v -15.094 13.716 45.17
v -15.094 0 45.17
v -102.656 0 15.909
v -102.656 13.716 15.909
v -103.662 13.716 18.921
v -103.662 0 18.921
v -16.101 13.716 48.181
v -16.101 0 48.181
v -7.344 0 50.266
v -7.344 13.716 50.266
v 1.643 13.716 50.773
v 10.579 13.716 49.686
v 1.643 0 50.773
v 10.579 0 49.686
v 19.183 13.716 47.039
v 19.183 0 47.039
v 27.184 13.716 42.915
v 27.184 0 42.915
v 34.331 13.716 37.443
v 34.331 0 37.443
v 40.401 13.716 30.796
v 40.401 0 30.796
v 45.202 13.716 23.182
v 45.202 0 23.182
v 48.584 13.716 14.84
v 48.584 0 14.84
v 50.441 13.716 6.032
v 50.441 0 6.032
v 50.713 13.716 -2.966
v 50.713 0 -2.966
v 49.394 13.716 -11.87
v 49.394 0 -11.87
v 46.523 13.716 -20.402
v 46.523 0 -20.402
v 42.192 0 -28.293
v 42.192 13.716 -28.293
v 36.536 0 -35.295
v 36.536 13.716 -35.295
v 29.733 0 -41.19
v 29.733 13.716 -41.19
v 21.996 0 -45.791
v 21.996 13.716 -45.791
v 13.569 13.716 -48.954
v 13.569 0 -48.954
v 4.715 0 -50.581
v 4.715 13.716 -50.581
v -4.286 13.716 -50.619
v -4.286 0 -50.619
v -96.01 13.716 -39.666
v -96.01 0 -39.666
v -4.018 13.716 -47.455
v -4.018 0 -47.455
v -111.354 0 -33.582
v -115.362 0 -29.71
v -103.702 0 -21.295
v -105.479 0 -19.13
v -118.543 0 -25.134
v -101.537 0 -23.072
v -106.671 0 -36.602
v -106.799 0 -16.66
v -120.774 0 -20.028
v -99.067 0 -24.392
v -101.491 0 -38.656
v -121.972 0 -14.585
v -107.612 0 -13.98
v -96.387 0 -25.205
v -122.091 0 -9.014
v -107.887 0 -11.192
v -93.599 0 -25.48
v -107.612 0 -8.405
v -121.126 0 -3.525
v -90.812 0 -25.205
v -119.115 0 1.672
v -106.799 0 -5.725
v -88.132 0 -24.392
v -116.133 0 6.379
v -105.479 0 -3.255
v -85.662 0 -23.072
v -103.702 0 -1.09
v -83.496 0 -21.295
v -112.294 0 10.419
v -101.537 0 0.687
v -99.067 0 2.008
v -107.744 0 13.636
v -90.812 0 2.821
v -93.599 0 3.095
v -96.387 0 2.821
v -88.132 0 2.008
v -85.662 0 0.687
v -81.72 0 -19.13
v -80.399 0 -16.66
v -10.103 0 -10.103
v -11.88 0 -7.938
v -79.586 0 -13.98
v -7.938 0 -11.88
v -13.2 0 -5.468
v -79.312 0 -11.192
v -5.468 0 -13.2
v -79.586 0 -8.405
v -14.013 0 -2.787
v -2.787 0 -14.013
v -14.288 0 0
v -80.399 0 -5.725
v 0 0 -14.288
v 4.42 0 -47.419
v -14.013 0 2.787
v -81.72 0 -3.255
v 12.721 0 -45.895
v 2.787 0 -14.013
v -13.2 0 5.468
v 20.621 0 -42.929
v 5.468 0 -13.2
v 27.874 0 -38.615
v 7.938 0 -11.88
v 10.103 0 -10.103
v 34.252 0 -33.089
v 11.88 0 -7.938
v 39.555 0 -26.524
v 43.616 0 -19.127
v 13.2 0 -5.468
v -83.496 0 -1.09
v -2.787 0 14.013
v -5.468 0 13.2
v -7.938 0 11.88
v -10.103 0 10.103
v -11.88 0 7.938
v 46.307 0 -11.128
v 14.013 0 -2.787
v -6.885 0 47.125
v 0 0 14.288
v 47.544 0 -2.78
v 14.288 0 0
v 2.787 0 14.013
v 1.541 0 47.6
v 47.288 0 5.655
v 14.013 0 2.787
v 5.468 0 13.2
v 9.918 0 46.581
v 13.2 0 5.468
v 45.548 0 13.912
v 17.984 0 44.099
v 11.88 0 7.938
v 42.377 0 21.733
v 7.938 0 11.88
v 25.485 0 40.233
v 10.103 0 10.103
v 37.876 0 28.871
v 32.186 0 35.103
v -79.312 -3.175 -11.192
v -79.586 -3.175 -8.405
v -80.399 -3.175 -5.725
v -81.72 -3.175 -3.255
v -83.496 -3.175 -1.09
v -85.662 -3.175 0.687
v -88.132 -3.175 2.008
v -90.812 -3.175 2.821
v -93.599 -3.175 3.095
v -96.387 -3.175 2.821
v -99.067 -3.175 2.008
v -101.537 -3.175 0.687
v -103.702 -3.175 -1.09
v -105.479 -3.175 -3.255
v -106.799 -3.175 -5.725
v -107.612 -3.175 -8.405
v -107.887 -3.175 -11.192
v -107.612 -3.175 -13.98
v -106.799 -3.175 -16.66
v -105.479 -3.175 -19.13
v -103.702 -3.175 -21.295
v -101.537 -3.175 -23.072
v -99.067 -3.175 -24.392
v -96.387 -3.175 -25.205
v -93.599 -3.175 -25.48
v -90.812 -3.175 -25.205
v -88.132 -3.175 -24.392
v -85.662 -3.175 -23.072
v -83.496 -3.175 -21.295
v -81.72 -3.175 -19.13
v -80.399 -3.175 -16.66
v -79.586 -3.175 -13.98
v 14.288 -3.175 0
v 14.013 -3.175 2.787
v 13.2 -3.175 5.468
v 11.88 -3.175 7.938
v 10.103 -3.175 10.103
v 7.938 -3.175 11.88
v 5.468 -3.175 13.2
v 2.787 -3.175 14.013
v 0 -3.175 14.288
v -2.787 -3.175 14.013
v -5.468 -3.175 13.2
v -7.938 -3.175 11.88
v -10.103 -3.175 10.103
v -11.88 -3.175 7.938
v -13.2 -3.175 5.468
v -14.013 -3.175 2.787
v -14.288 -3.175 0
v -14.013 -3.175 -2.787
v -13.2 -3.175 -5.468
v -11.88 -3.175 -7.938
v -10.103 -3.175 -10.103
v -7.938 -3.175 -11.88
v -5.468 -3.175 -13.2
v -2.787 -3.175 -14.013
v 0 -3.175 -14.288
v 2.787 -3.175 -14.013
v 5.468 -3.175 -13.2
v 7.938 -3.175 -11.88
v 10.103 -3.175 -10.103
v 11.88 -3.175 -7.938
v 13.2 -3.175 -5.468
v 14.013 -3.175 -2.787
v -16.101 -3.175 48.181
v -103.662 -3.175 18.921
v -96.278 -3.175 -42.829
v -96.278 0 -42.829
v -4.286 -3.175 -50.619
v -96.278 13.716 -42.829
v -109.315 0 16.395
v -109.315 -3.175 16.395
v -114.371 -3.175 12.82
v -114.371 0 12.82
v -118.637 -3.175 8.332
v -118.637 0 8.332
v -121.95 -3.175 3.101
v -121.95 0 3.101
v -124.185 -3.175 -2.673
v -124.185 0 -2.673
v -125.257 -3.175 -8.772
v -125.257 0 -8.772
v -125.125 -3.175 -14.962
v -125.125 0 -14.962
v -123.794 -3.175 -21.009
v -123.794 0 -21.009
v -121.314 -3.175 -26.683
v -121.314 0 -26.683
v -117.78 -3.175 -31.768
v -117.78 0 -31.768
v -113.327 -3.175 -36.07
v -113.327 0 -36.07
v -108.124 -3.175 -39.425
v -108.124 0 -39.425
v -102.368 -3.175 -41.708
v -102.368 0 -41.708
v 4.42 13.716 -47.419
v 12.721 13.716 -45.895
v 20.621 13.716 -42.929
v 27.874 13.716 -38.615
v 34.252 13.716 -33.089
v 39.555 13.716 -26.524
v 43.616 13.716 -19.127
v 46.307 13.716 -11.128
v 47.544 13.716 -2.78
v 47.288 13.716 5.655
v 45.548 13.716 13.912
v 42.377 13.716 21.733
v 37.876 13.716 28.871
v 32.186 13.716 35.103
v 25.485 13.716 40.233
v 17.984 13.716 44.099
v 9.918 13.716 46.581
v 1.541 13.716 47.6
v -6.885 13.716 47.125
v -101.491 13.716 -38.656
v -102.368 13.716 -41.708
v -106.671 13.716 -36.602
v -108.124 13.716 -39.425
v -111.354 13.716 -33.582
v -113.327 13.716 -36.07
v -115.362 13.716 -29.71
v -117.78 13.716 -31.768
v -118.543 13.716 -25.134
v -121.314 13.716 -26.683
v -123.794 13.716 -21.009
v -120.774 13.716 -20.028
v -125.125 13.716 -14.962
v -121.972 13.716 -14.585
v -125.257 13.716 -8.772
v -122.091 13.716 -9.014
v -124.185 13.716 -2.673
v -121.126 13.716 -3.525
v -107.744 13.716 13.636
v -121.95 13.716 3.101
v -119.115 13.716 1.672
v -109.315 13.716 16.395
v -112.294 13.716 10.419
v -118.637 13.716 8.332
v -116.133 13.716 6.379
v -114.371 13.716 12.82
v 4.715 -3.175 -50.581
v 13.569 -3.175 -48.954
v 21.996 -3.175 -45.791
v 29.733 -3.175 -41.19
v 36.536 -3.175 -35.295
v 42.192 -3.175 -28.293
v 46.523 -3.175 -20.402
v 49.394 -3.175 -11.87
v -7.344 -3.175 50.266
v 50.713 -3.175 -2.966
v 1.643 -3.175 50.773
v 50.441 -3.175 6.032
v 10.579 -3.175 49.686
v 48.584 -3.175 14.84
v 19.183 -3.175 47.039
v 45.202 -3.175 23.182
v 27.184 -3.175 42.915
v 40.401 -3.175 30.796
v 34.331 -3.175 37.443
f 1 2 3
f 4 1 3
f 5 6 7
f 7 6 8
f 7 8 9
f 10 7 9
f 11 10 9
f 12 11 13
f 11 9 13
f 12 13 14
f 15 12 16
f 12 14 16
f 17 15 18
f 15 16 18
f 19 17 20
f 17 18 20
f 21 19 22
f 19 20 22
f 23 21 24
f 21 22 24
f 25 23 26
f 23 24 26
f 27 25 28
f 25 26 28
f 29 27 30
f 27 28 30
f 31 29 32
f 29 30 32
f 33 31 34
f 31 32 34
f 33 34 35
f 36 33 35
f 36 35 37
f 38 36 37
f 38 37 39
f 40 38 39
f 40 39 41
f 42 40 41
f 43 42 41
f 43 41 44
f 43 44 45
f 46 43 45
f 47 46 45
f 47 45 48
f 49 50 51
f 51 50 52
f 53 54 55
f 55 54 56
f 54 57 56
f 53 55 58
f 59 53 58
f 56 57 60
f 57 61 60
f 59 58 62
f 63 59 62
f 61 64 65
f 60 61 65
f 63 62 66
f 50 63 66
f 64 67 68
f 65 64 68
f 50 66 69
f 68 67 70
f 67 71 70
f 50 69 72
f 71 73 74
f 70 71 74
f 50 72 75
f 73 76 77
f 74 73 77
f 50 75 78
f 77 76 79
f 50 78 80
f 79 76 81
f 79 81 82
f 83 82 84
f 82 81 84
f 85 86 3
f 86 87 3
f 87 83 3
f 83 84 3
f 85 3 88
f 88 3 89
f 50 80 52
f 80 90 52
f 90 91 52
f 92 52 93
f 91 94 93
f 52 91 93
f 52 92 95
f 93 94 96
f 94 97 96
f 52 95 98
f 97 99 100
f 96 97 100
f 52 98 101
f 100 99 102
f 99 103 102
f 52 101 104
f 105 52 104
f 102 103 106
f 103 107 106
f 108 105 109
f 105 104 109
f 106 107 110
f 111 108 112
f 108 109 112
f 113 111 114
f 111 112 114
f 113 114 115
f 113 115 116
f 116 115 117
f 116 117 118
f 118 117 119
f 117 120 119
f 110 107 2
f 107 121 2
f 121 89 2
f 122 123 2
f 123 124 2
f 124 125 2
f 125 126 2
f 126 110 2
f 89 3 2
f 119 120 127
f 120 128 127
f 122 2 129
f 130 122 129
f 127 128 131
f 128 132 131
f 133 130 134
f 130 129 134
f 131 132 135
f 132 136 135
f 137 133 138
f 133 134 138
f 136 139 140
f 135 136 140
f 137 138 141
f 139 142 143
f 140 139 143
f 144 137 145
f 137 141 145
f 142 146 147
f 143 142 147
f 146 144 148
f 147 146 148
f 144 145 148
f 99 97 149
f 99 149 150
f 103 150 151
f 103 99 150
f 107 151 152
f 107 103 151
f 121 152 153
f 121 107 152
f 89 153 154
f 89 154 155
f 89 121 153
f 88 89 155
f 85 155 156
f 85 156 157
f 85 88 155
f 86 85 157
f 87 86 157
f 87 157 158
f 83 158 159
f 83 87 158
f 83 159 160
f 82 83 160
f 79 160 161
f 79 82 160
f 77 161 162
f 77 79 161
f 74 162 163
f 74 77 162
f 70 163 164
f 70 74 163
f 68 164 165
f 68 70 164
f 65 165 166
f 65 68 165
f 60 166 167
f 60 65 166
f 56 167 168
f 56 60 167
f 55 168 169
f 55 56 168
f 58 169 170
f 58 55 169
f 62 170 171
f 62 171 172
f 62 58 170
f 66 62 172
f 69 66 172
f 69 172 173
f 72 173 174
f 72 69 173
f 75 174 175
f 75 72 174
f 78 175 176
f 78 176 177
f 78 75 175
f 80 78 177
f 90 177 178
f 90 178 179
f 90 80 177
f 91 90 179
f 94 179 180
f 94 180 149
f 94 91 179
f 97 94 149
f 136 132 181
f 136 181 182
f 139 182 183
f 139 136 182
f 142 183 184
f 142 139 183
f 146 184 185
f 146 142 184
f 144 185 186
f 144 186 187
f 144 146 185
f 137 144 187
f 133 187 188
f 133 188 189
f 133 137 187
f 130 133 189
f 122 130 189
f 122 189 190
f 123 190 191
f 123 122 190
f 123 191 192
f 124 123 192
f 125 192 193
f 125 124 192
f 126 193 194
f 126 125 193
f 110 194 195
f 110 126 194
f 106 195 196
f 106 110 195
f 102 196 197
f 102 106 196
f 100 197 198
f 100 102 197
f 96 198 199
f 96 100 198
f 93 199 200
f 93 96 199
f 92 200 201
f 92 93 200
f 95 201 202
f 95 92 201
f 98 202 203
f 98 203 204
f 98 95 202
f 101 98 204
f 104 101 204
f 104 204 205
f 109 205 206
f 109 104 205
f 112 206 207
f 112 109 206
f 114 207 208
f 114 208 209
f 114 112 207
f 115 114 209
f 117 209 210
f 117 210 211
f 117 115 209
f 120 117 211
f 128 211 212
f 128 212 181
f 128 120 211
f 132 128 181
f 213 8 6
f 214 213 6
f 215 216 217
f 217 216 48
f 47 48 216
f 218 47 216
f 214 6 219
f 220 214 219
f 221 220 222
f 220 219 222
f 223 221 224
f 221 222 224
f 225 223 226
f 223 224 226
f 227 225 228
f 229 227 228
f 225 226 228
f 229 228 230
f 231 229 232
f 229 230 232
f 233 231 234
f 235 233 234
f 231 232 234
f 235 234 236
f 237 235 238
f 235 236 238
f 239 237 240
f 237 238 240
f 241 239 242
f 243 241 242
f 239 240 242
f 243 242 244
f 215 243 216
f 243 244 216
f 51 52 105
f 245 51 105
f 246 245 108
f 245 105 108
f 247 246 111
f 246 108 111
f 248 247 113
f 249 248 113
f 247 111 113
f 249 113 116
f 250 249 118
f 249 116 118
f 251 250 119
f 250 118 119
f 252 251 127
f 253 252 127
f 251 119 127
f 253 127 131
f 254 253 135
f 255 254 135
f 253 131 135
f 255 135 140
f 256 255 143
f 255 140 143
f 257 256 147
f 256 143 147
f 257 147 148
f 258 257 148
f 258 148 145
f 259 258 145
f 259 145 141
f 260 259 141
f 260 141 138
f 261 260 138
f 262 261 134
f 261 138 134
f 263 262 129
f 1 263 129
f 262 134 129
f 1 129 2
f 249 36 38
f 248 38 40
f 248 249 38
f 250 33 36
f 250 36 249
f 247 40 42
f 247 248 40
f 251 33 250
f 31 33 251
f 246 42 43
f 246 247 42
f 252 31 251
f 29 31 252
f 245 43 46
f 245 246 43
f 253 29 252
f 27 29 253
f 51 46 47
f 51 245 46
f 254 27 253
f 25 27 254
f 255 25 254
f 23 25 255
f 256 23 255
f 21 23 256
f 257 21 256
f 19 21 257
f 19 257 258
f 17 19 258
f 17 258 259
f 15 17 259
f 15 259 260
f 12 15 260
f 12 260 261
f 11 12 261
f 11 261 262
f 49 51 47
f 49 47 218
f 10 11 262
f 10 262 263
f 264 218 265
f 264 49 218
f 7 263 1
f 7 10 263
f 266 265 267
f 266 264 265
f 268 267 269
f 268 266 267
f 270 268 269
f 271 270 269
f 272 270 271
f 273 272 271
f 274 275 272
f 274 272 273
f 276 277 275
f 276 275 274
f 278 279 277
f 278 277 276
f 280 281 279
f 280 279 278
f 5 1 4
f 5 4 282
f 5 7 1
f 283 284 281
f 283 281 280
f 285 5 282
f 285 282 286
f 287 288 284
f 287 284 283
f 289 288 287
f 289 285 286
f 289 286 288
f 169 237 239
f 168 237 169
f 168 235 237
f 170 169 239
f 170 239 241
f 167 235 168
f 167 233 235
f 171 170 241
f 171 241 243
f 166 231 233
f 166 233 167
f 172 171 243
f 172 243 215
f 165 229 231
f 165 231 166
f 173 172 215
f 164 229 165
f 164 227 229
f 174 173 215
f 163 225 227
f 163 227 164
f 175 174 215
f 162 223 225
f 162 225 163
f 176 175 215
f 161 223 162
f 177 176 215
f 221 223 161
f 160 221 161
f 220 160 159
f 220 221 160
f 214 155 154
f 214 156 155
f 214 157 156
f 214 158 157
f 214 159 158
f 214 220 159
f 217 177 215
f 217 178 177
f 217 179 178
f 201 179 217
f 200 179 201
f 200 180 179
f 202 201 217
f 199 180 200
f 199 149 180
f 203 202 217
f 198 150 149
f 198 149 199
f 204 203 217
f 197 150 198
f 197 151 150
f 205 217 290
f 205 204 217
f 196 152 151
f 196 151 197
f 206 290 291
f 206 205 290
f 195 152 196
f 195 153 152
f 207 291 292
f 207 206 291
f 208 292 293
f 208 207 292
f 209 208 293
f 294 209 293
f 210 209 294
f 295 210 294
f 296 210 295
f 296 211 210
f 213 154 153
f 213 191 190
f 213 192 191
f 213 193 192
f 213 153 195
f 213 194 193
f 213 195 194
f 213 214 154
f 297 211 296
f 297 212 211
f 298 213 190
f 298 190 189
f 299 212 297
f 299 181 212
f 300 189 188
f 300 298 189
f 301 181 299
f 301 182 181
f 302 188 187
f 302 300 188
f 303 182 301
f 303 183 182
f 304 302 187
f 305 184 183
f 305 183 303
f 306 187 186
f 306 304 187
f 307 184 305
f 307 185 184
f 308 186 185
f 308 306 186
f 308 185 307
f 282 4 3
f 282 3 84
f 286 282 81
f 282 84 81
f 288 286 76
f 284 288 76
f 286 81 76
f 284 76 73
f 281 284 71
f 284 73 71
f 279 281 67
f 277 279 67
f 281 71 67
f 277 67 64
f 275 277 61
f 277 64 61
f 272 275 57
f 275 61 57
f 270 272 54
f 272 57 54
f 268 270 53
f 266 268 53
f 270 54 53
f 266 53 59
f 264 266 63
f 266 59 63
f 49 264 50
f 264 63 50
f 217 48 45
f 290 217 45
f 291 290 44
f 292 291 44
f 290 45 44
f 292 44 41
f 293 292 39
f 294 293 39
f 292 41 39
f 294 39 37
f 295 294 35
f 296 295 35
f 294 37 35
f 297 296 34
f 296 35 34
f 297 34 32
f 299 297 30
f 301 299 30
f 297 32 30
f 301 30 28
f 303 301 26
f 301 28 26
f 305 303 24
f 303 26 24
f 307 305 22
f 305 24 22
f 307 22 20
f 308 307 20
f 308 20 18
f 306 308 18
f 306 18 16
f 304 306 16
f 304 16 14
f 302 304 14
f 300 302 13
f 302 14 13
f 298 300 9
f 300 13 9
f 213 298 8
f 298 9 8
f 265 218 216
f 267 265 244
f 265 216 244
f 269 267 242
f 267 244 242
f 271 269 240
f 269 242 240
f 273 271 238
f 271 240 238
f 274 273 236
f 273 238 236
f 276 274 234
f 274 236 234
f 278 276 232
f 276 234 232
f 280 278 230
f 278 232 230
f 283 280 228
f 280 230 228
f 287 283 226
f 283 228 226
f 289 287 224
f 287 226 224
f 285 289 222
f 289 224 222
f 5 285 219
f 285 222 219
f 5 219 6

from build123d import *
from build123d import SkipClean  # not in build123d's __all__

# Parameters (mm, degrees)
F0_R     = 14.2875
F1_DEPTH = 3.175
F3_DEPTH = 13.716


# Not quite as in the source:
# - a feature names something its author has since deleted; it is built from what else it names


with BuildPart() as f1:
    # F0 (on Front) → F1 (new body)
    with BuildSketch(Plane.XZ):
        with BuildLine():
            Line((-96.2781986811, -42.8291897772), (-4.2862845567, -50.6188479195))
            ThreePointArc((-4.2862845567, -50.6188479195), (50.4406573252, 6.0315908845), (-16.1005722699, 48.1810291773))
            Line((-16.1005722699, 48.1810291773), (-103.6621285019, 18.9207334083))
            ThreePointArc((-103.6621285019, 18.9207334083), (-125.3487825032, -11.3685027389), (-103.3274855148, -41.4153206587))
            ThreePointArc((-103.3274855148, -41.4153206587), (-99.8429919119, -42.3224346764), (-96.2781986811, -42.8291897772))
        make_face()
        with BuildLine():
            Line((-102.655842735, 15.9094190847), (-15.0942865031, 45.1697148537))
            ThreePointArc((-15.0942865031, 45.1697148537), (47.2881162424, 5.6546164542), (-4.0183917719, -47.4551699245))
            Line((-4.0183917719, -47.4551699245), (-96.0103058963, -39.6655117822))
            ThreePointArc((-96.0103058963, -39.6655117822), (-121.9721405786, -14.5851797), (-102.655842735, 15.9094190847))
        make_face(mode=Mode.SUBTRACT)
        with BuildLine():
            ThreePointArc((-4.0183917719, -47.4551699245), (47.2881162424, 5.6546164542), (-15.0942865031, 45.1697148537))
            Line((-15.0942865031, 45.1697148537), (-102.655842735, 15.9094190847))
            ThreePointArc((-102.655842735, 15.9094190847), (-121.9721405786, -14.5851797), (-96.0103058963, -39.6655117822))
            Line((-96.0103058963, -39.6655117822), (-4.0183917719, -47.4551699245))
        make_face()
        with Locations((-93.5992708332, -11.1924098275)):
            Circle(F0_R, mode=Mode.SUBTRACT)
        Circle(F0_R, mode=Mode.SUBTRACT)
    extrude(amount=F1_DEPTH)

    # F2 (on face) → F3 (join)
    with BuildSketch(Plane(origin=(0, 0, 0), x_dir=(-1, 0, 0), z_dir=(0, 1, 0))):
        with BuildLine():
            ThreePointArc((96.2781986811, -42.8291897772), (125.1246816615, -14.9621541303), (103.6621285019, 18.9207334083))
            Line((103.6621285019, 18.9207334083), (16.1005722699, 48.1810291773))
            ThreePointArc((16.1005722699, 48.1810291773), (-50.4406573252, 6.0315908845), (4.2862845567, -50.6188479195))
            Line((4.2862845567, -50.6188479195), (96.2781986811, -42.8291897772))
        make_face()
        with BuildLine():
            Line((15.0942865031, 45.1697148537), (102.655842735, 15.9094190847))
            ThreePointArc((102.655842735, 15.9094190847), (121.9721405786, -14.5851797), (96.0103058963, -39.6655117822))
            Line((96.0103058963, -39.6655117822), (4.0183917719, -47.4551699245))
            ThreePointArc((4.0183917719, -47.4551699245), (-47.2881162424, 5.6546164542), (15.0942865031, 45.1697148537))
        make_face(mode=Mode.SUBTRACT)
    with SkipClean():  # cleaning this boolean's faces spoils the solid; the shape is the same uncleaned
        extrude(amount=F3_DEPTH)


solid = f1.part
